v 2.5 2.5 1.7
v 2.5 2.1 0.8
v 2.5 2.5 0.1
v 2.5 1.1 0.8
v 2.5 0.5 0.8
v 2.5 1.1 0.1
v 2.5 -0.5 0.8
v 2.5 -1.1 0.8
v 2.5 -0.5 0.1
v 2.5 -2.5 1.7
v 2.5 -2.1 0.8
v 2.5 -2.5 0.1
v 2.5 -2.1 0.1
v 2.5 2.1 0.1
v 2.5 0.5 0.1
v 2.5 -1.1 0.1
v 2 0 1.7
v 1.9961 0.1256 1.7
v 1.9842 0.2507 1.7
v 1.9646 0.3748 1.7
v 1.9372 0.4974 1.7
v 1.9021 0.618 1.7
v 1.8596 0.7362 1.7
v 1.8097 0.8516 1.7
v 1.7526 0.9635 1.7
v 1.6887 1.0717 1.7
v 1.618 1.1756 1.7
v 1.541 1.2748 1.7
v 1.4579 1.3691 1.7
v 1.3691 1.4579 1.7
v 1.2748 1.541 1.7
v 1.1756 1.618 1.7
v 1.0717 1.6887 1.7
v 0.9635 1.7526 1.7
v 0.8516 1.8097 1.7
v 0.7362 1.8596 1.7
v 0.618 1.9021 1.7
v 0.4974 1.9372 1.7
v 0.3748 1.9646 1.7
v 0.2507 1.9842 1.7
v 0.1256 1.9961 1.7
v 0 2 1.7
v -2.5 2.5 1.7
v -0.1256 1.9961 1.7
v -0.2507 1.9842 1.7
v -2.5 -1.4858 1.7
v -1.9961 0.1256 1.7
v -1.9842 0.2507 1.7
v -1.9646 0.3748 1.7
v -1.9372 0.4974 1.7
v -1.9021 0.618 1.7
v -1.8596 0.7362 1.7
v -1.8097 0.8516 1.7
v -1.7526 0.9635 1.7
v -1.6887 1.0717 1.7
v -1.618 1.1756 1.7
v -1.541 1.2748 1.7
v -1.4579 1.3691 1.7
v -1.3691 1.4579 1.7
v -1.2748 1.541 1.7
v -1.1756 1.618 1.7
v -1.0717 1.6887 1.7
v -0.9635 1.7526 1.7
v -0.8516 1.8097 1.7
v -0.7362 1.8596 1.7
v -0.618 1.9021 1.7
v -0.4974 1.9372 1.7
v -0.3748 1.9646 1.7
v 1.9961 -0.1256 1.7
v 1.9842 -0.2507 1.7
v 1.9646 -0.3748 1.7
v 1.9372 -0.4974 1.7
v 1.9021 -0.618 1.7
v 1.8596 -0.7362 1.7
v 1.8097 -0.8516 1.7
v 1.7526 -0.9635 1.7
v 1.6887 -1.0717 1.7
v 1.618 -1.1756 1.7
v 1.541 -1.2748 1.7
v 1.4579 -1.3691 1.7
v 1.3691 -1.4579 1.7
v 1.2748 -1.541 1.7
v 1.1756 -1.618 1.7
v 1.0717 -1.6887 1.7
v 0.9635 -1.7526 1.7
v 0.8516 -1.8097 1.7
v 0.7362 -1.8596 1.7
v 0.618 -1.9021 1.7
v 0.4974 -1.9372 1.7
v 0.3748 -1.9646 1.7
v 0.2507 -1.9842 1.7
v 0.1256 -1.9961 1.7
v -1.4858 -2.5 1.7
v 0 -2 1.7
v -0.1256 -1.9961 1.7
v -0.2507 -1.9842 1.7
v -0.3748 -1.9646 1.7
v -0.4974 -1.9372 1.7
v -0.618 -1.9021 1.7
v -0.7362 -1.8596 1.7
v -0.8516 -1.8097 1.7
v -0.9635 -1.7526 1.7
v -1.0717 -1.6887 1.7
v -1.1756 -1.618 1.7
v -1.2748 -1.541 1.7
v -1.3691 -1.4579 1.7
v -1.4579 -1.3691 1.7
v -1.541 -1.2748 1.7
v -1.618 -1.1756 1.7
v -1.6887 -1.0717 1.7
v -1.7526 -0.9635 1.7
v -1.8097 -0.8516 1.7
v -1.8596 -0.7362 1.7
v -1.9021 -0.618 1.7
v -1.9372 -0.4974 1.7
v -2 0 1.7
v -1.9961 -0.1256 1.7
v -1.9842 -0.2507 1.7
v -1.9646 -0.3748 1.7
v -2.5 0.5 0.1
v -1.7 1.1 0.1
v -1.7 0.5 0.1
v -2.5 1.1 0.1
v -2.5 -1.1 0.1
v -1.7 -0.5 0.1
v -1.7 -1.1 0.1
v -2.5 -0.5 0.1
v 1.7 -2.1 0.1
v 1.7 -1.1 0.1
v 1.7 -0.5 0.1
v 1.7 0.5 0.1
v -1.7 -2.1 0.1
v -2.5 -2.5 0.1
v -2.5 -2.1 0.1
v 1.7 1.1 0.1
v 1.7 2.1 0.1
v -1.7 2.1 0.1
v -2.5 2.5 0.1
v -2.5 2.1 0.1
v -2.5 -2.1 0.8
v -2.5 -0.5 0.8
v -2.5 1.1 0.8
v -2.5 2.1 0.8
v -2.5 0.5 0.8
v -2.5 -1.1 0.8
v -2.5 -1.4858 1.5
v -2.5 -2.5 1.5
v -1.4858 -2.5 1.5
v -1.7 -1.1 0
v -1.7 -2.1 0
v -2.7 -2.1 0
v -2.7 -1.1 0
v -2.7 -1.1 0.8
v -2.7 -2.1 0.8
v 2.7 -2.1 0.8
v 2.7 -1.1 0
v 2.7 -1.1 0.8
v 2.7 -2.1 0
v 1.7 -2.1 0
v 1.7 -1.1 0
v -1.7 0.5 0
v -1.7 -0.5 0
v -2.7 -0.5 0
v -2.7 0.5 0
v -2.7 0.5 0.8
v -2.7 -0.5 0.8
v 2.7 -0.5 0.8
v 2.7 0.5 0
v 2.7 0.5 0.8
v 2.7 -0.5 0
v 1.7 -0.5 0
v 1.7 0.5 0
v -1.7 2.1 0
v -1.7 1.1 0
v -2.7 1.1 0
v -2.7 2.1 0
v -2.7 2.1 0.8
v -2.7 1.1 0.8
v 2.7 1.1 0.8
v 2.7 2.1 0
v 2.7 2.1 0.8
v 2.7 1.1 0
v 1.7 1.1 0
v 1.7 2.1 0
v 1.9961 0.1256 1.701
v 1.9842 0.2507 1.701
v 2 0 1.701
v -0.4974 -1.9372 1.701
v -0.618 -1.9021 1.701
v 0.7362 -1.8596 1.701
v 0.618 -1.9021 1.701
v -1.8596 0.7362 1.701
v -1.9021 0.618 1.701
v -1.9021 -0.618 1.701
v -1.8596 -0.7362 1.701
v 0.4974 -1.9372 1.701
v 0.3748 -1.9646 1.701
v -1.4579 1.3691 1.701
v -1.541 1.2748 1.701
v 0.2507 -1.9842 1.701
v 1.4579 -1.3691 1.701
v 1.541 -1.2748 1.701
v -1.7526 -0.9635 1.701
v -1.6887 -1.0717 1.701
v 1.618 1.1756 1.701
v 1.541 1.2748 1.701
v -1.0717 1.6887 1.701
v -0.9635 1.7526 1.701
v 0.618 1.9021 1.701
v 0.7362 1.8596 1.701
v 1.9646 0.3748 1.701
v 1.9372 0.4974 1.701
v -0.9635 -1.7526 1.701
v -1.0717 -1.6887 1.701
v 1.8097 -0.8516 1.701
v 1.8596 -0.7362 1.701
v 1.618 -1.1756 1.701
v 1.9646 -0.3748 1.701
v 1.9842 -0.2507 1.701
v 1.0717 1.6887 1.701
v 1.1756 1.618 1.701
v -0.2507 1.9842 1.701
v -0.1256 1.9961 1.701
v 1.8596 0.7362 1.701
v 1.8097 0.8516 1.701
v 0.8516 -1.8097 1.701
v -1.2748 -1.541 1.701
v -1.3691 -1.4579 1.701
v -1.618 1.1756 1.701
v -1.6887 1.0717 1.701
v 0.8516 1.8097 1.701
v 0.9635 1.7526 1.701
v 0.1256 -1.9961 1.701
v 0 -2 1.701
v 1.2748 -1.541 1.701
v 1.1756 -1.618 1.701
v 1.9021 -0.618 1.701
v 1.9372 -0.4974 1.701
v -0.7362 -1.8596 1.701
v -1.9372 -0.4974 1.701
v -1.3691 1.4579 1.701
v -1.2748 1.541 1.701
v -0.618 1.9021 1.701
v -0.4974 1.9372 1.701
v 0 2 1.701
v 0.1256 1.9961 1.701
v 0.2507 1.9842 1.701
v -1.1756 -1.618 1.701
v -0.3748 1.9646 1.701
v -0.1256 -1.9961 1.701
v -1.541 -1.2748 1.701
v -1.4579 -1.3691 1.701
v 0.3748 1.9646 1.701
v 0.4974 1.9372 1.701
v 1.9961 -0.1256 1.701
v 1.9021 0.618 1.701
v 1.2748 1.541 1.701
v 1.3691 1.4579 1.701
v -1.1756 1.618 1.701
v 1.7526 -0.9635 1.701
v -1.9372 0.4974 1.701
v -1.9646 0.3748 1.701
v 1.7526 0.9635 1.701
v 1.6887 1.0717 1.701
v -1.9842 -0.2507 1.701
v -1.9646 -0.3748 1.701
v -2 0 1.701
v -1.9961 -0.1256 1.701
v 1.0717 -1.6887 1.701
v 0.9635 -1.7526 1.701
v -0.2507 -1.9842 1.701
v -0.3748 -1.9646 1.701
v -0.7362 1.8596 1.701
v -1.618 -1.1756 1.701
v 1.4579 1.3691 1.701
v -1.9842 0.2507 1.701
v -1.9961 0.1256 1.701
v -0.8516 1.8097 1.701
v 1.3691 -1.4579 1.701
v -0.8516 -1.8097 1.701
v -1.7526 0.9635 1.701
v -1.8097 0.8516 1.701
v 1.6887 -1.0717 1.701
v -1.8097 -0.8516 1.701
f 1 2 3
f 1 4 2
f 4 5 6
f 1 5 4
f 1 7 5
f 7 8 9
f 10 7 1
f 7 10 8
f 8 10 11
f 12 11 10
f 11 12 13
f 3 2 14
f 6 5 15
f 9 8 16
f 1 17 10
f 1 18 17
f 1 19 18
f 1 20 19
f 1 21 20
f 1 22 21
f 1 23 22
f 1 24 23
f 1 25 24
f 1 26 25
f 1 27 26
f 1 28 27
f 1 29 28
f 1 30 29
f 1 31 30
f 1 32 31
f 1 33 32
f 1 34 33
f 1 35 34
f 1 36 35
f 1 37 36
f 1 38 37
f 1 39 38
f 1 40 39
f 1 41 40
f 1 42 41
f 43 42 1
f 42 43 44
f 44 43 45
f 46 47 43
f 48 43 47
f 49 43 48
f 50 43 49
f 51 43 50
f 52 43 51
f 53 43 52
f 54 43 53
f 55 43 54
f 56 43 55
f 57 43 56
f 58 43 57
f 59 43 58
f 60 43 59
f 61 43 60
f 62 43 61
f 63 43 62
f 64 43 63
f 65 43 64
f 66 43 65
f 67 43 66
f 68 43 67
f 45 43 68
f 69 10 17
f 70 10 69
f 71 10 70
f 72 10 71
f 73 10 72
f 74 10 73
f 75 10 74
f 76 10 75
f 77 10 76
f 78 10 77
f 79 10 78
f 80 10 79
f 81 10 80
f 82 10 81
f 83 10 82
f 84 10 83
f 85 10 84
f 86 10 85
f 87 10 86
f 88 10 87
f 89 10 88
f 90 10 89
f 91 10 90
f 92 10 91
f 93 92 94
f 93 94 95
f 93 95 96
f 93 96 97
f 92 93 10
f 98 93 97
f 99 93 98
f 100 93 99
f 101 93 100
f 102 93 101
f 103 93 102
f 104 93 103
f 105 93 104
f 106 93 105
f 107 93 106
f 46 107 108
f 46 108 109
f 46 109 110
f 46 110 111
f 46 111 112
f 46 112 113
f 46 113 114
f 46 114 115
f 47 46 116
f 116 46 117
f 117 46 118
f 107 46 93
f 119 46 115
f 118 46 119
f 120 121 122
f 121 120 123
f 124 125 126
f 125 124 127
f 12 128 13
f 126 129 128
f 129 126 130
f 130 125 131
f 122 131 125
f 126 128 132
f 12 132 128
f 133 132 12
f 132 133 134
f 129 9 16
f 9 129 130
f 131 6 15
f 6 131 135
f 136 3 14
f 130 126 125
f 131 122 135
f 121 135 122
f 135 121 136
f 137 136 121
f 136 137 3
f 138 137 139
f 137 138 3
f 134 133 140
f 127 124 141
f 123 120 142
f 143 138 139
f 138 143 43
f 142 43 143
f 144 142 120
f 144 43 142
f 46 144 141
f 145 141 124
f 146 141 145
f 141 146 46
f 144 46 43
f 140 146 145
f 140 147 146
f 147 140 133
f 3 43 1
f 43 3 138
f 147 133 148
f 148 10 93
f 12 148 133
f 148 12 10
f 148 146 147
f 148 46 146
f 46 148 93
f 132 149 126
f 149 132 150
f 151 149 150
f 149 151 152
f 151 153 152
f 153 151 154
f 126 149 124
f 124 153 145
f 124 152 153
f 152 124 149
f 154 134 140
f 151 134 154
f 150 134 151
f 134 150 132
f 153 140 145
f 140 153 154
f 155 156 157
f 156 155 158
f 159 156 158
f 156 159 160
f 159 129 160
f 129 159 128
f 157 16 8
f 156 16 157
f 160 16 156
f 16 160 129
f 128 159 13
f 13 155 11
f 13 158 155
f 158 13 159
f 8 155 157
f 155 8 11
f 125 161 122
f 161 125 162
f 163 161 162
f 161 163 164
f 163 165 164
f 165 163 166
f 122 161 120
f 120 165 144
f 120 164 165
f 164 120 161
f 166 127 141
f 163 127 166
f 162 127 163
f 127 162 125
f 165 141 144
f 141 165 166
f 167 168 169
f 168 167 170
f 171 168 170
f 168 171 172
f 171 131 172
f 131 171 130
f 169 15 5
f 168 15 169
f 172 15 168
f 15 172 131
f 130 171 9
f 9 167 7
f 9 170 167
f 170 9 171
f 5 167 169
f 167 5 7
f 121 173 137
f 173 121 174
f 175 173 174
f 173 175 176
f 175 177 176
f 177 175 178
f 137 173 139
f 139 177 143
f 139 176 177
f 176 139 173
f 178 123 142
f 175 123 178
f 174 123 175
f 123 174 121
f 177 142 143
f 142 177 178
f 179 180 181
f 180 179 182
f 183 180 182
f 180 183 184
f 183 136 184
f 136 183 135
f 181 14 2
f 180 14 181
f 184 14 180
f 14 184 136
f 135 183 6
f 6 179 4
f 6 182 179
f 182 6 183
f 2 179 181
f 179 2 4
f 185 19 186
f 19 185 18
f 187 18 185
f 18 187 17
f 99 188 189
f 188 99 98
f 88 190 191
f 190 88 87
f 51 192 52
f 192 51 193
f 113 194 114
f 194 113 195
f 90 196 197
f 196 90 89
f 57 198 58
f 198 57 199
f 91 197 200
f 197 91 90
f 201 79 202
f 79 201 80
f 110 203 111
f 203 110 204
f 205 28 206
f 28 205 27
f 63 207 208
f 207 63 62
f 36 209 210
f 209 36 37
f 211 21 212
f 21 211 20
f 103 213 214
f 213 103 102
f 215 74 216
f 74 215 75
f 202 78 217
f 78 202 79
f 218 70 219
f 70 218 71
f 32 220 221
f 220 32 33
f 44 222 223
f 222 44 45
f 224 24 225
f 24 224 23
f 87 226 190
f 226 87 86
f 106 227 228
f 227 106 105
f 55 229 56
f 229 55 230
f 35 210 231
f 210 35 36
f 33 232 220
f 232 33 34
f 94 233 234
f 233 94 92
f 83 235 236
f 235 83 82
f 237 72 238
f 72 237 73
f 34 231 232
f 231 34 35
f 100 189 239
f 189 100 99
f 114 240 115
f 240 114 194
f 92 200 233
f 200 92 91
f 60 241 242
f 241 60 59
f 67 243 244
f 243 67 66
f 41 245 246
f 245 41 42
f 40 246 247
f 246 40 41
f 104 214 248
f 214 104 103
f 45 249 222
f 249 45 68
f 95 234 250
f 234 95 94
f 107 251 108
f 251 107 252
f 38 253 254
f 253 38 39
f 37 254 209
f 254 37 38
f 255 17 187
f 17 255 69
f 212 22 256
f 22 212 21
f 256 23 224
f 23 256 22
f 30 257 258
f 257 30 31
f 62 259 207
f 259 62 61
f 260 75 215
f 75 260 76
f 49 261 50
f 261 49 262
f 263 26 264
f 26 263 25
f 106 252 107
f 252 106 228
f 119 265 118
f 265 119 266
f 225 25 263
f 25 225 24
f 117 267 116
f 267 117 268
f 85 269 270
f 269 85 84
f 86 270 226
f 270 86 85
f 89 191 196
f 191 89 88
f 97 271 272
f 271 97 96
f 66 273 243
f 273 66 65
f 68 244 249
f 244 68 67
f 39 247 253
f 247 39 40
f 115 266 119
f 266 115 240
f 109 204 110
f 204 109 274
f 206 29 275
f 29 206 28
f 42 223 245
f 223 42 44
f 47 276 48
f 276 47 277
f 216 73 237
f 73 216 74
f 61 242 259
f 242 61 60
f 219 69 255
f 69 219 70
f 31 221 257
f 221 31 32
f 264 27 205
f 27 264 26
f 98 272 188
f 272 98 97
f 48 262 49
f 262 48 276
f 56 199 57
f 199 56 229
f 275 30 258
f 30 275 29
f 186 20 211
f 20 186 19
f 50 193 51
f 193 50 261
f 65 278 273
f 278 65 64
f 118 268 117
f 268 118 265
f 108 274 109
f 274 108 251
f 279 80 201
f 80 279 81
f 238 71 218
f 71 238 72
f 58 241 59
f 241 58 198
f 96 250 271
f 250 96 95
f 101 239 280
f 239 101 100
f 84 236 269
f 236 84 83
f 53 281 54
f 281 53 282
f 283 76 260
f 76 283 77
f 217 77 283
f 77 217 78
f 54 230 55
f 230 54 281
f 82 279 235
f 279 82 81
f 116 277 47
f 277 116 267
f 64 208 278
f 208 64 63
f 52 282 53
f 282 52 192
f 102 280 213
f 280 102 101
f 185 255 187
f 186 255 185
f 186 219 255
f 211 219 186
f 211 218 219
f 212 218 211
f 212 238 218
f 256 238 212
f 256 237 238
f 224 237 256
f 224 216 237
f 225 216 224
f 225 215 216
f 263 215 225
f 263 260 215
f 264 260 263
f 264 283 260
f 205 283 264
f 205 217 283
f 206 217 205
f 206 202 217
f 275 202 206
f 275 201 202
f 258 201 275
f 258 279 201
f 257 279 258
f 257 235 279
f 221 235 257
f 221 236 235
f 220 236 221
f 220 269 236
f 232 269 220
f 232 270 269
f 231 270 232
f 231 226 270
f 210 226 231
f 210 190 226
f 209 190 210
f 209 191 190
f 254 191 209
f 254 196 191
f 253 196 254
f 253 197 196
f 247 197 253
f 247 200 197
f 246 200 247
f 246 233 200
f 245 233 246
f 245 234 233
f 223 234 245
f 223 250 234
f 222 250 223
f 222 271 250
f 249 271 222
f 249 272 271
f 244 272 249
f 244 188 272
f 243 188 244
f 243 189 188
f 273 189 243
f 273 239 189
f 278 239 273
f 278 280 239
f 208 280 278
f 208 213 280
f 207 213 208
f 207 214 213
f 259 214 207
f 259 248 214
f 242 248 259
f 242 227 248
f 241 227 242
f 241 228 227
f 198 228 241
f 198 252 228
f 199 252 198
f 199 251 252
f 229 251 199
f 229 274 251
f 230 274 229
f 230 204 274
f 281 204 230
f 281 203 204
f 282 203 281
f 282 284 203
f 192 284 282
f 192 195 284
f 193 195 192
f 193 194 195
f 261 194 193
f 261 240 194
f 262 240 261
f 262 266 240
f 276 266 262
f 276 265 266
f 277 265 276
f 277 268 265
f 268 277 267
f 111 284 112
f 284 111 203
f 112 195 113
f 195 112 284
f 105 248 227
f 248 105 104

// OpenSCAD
// 5050 SMD LED
// Body
color("white")
    difference()
    {
        translate([-2.5,-2.5,0.1])
                cube([5,5,1.6]);
        translate([-2.7,-2.7,2])        
            rotate([0,0,45])        
                cube([2,2,1],center=true);
    }

// Yellow spot    
translate([0,0,0.701])
    color("yellow")
        cylinder(h=1,r=2,$fn=100);

// Pin
color("gray")
    for(i=[-1.6,0,1.6])
        for(j=[-1,1])
        {
            translate([j * 2.2,i,0.1])
                cube([1,1,0.2],center=true);
            translate([j * 2.6,i,0.4])
                cube([0.2,1,0.8],center = true);
        }
